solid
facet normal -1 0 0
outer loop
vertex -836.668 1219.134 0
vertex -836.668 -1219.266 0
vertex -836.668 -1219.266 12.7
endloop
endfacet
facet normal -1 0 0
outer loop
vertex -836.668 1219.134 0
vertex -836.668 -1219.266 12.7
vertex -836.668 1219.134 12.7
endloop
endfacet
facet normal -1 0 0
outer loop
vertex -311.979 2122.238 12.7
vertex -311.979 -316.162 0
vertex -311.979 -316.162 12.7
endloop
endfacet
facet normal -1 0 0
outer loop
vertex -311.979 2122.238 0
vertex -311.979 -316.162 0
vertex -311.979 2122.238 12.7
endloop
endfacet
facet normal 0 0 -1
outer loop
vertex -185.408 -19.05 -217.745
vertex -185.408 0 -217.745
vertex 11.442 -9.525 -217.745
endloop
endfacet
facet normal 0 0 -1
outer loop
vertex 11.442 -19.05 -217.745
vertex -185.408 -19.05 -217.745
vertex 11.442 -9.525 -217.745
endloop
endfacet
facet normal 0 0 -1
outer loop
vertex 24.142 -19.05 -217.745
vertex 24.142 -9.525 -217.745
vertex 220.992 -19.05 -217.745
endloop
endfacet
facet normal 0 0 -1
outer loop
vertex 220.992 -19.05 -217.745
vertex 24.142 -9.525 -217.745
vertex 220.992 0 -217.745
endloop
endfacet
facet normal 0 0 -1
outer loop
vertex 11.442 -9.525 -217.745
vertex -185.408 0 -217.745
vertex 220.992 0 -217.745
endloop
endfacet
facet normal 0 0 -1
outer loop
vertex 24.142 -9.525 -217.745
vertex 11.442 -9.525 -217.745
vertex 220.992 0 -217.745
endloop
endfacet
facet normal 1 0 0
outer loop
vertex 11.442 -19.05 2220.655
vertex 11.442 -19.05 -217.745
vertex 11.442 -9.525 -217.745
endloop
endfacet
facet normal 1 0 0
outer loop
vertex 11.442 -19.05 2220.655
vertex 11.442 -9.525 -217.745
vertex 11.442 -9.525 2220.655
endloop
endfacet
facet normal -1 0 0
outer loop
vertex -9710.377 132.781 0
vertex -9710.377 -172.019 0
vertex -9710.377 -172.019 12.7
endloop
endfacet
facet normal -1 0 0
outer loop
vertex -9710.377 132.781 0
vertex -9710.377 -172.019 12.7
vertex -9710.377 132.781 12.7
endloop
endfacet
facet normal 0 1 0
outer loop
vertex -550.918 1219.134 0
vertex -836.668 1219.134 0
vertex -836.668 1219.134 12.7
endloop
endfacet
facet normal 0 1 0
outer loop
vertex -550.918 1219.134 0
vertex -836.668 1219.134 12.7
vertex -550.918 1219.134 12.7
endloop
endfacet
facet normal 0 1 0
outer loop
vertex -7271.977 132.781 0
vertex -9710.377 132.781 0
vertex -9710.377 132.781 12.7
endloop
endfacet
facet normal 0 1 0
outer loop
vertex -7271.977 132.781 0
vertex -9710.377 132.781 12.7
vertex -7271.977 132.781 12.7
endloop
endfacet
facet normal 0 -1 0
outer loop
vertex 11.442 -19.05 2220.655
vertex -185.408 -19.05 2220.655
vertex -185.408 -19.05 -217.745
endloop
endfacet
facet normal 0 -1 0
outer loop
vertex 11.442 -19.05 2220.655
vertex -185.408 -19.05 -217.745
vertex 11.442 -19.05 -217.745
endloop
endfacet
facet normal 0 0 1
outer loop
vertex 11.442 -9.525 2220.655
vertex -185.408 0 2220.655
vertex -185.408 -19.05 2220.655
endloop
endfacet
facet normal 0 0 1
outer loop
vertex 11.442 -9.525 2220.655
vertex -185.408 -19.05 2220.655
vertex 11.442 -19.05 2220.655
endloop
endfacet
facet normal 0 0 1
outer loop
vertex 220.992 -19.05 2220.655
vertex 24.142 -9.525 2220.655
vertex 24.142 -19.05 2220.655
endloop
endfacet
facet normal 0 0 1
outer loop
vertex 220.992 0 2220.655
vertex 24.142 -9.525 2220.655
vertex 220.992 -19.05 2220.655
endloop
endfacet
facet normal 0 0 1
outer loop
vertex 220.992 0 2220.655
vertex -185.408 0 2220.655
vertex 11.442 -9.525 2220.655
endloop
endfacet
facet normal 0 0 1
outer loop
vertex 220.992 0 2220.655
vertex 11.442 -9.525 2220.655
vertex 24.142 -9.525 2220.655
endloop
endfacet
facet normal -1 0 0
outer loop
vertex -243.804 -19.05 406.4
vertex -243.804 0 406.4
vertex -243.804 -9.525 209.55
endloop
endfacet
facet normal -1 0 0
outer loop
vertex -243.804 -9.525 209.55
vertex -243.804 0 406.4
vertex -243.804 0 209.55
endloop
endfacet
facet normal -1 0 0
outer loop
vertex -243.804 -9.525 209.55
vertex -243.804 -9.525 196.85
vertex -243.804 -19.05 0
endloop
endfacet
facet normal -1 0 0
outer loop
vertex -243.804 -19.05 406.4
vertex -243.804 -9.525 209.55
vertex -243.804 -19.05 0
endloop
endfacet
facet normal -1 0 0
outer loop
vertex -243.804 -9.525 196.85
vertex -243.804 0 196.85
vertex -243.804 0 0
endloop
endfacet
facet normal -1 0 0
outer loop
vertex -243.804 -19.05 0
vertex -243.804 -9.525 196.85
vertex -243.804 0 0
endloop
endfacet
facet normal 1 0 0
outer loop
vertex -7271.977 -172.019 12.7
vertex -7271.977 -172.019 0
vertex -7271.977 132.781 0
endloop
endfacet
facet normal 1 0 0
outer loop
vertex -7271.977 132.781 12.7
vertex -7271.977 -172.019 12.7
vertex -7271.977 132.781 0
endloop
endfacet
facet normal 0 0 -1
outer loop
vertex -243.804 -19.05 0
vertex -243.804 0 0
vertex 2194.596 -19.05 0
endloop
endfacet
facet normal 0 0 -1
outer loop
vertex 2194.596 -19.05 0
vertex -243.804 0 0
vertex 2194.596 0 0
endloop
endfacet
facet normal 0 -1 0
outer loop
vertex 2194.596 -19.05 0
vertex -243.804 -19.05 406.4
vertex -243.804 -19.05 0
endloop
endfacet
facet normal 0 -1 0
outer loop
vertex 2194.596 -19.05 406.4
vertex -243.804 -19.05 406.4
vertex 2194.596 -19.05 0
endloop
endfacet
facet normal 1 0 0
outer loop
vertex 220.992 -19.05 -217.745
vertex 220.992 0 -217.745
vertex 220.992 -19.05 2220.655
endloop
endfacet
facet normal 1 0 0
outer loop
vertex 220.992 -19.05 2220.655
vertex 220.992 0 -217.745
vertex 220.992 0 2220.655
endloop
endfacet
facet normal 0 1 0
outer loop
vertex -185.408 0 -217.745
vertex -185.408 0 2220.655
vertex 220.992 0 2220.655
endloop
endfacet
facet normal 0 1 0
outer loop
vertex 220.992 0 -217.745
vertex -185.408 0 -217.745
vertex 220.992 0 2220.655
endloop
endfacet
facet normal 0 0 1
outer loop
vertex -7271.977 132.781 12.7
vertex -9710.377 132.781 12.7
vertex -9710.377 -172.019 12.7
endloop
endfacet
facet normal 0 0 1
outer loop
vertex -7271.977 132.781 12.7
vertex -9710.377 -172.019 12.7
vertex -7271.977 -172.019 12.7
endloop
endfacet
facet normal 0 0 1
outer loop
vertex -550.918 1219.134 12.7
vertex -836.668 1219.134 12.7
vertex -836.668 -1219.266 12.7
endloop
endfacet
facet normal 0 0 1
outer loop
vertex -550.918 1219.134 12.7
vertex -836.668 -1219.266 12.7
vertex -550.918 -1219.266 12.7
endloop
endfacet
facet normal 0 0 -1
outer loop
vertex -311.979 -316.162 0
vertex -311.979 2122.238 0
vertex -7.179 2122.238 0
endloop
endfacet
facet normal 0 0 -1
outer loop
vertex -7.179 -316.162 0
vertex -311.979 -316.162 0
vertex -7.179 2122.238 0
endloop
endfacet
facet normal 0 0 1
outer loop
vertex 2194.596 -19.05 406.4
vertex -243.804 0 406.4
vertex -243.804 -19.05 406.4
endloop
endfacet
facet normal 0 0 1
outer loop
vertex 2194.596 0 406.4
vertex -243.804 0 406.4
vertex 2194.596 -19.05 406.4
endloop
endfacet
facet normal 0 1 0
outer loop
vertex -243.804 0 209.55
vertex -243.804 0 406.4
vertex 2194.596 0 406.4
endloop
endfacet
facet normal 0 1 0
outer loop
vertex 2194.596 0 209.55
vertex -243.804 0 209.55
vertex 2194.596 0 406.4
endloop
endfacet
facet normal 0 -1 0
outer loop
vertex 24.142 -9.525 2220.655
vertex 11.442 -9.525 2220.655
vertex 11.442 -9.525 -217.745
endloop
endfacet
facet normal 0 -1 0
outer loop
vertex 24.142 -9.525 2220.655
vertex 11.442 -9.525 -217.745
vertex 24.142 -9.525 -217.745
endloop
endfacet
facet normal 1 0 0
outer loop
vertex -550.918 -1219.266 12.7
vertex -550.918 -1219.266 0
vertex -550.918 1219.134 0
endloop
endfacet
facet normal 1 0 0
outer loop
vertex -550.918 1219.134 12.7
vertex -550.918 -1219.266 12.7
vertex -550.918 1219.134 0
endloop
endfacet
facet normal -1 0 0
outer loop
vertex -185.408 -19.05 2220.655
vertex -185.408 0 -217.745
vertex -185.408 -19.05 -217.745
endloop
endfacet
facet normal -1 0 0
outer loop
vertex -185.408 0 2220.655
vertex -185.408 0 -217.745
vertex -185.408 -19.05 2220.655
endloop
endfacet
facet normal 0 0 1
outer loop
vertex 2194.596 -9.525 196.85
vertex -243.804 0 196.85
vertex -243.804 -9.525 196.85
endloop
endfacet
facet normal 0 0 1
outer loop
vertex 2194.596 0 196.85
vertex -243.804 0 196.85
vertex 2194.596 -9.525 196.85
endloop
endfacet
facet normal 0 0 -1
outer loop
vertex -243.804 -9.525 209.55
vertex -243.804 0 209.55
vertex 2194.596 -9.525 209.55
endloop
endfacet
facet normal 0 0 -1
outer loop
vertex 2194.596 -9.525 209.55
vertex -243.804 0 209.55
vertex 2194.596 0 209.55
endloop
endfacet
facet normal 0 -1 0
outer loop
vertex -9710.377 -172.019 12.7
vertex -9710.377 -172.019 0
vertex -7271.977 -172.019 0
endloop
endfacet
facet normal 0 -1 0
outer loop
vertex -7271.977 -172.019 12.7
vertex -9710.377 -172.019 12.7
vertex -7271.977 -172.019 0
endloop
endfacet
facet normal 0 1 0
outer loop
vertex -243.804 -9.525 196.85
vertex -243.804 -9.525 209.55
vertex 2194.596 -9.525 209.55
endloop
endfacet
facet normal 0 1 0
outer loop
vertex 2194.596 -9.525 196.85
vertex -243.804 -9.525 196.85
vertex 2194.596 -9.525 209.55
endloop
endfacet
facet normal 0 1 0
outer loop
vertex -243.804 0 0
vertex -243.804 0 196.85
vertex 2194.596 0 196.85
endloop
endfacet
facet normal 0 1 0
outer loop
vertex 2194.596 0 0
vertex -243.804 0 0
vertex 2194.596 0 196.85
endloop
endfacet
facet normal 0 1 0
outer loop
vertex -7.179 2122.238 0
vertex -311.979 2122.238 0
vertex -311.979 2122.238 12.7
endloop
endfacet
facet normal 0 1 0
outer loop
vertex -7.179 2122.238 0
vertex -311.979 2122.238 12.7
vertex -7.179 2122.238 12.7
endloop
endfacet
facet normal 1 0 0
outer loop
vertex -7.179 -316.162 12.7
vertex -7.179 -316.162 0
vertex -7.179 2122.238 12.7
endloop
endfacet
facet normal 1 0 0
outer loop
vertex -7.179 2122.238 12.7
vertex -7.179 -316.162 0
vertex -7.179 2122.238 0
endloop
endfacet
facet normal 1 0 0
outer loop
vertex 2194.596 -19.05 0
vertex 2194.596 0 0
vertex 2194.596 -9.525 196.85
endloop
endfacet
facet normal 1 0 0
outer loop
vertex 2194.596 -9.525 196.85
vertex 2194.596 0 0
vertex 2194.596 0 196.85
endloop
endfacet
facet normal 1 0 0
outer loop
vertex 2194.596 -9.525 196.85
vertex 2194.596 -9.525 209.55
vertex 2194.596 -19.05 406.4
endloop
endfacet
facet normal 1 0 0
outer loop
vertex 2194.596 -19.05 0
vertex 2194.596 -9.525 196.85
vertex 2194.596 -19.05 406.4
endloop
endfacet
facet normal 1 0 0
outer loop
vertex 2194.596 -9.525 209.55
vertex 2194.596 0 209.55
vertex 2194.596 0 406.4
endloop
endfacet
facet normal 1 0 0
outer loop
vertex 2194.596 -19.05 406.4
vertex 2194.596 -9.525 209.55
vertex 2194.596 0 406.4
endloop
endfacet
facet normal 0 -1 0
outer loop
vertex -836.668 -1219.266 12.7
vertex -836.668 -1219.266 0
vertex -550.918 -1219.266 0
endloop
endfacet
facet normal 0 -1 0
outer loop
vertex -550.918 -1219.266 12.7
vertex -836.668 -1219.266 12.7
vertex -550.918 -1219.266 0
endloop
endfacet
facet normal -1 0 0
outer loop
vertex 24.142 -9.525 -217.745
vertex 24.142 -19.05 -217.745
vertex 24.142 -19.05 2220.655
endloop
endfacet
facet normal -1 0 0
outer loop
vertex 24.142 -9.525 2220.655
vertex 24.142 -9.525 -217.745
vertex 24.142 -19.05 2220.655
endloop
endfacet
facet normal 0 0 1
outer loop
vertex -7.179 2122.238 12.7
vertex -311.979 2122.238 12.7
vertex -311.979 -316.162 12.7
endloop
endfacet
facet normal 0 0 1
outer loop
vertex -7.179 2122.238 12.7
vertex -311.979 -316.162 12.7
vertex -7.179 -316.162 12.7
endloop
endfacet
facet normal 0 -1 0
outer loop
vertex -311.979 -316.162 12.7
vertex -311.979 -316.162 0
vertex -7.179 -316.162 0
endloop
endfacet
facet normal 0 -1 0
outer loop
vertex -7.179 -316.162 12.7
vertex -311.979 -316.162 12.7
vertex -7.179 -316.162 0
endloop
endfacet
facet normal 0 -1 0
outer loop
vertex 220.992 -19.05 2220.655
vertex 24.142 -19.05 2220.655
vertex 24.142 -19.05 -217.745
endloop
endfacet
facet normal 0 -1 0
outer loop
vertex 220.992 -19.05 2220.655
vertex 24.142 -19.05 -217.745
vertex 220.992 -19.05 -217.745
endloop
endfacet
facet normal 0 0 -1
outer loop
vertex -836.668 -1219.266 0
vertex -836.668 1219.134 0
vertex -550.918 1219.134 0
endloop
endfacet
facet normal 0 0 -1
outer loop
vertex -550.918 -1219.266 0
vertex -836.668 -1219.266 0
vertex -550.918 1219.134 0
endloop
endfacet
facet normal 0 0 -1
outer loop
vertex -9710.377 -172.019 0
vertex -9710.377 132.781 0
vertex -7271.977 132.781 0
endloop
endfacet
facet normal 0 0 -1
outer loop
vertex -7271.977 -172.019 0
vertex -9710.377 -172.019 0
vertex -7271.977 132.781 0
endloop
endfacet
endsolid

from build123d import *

# Parameters (mm, degrees)
F0_W      = 304.8
F0_H      = 2438.4
F1_DEPTH  = 12.7
F2_W      = 2438.4
F2_H      = 304.8
F3_DEPTH  = 12.7
F4_W      = 406.4
F4_H      = 2438.4
F5_DEPTH  = 19.05
F6_W      = 12.7
F6_H      = 2438.4
F7_DEPTH  = 9.525
F8_W      = 2438.4
F8_H      = 196.85
F8_H_2    = 12.7
F9_DEPTH  = 19.05
F10_DEPTH = 9.525
F11_W     = 285.75
F11_H     = 2438.4
F12_DEPTH = 12.7


with BuildPart() as f1:
    # F0 (on Top) → F1 (new body)
    with BuildSketch(Plane.XY):
        with Locations((-159.5789045095, 903.038151103)):
            Rectangle(F0_W, F0_H)
    extrude(amount=F1_DEPTH)


with BuildPart() as f3:
    # F2 (on Top) → F3 (new body)
    with BuildSketch(Plane.XY):
        with Locations((-8491.1774787435, -19.6189805865)):
            Rectangle(F2_W, F2_H)
    extrude(amount=F3_DEPTH)


with BuildPart() as f5:
    # F4 (on Front) → F5 (new body)
    with BuildSketch(Plane.XZ):
        with Locations((17.7923515439, 1001.4546515647)):
            Rectangle(F4_W, F4_H)
    extrude(amount=F5_DEPTH)

    # F6 (on face) → F7 (cut)
    with BuildSketch(Plane.XZ.offset(19.05)):
        with Locations((17.7923515439, 1001.4546515647)):
            Rectangle(F6_W, F6_H)
    extrude(amount=-F7_DEPTH, mode=Mode.SUBTRACT)


with BuildPart() as f9:
    # F8 (on Front) → F9 (new body)
    with BuildSketch(Plane.XZ):
        with Locations((975.3959287659, 307.975)):
            Rectangle(F8_W, F8_H)
        with Locations((975.3959287659, 203.2)):
            Rectangle(F8_W, F8_H_2)
        with Locations((975.3959287659, 98.425)):
            Rectangle(F8_W, F8_H)
    extrude(amount=F9_DEPTH)

    # F8 (on Front) → F10 (cut)
    with BuildSketch(Plane.XZ):
        with Locations((975.3959287659, 203.2)):
            Rectangle(F8_W, F8_H_2)
    extrude(amount=F10_DEPTH, mode=Mode.SUBTRACT)


with BuildPart() as f12:
    # F11 (on Top) → F12 (new body)
    with BuildSketch(Plane.XY):
        with Locations((-693.7926063842, -0.0663548708)):
            Rectangle(F11_W, F11_H)
    extrude(amount=F12_DEPTH)


solid = Compound([f1.part, f3.part, f5.part, f9.part, f12.part])
